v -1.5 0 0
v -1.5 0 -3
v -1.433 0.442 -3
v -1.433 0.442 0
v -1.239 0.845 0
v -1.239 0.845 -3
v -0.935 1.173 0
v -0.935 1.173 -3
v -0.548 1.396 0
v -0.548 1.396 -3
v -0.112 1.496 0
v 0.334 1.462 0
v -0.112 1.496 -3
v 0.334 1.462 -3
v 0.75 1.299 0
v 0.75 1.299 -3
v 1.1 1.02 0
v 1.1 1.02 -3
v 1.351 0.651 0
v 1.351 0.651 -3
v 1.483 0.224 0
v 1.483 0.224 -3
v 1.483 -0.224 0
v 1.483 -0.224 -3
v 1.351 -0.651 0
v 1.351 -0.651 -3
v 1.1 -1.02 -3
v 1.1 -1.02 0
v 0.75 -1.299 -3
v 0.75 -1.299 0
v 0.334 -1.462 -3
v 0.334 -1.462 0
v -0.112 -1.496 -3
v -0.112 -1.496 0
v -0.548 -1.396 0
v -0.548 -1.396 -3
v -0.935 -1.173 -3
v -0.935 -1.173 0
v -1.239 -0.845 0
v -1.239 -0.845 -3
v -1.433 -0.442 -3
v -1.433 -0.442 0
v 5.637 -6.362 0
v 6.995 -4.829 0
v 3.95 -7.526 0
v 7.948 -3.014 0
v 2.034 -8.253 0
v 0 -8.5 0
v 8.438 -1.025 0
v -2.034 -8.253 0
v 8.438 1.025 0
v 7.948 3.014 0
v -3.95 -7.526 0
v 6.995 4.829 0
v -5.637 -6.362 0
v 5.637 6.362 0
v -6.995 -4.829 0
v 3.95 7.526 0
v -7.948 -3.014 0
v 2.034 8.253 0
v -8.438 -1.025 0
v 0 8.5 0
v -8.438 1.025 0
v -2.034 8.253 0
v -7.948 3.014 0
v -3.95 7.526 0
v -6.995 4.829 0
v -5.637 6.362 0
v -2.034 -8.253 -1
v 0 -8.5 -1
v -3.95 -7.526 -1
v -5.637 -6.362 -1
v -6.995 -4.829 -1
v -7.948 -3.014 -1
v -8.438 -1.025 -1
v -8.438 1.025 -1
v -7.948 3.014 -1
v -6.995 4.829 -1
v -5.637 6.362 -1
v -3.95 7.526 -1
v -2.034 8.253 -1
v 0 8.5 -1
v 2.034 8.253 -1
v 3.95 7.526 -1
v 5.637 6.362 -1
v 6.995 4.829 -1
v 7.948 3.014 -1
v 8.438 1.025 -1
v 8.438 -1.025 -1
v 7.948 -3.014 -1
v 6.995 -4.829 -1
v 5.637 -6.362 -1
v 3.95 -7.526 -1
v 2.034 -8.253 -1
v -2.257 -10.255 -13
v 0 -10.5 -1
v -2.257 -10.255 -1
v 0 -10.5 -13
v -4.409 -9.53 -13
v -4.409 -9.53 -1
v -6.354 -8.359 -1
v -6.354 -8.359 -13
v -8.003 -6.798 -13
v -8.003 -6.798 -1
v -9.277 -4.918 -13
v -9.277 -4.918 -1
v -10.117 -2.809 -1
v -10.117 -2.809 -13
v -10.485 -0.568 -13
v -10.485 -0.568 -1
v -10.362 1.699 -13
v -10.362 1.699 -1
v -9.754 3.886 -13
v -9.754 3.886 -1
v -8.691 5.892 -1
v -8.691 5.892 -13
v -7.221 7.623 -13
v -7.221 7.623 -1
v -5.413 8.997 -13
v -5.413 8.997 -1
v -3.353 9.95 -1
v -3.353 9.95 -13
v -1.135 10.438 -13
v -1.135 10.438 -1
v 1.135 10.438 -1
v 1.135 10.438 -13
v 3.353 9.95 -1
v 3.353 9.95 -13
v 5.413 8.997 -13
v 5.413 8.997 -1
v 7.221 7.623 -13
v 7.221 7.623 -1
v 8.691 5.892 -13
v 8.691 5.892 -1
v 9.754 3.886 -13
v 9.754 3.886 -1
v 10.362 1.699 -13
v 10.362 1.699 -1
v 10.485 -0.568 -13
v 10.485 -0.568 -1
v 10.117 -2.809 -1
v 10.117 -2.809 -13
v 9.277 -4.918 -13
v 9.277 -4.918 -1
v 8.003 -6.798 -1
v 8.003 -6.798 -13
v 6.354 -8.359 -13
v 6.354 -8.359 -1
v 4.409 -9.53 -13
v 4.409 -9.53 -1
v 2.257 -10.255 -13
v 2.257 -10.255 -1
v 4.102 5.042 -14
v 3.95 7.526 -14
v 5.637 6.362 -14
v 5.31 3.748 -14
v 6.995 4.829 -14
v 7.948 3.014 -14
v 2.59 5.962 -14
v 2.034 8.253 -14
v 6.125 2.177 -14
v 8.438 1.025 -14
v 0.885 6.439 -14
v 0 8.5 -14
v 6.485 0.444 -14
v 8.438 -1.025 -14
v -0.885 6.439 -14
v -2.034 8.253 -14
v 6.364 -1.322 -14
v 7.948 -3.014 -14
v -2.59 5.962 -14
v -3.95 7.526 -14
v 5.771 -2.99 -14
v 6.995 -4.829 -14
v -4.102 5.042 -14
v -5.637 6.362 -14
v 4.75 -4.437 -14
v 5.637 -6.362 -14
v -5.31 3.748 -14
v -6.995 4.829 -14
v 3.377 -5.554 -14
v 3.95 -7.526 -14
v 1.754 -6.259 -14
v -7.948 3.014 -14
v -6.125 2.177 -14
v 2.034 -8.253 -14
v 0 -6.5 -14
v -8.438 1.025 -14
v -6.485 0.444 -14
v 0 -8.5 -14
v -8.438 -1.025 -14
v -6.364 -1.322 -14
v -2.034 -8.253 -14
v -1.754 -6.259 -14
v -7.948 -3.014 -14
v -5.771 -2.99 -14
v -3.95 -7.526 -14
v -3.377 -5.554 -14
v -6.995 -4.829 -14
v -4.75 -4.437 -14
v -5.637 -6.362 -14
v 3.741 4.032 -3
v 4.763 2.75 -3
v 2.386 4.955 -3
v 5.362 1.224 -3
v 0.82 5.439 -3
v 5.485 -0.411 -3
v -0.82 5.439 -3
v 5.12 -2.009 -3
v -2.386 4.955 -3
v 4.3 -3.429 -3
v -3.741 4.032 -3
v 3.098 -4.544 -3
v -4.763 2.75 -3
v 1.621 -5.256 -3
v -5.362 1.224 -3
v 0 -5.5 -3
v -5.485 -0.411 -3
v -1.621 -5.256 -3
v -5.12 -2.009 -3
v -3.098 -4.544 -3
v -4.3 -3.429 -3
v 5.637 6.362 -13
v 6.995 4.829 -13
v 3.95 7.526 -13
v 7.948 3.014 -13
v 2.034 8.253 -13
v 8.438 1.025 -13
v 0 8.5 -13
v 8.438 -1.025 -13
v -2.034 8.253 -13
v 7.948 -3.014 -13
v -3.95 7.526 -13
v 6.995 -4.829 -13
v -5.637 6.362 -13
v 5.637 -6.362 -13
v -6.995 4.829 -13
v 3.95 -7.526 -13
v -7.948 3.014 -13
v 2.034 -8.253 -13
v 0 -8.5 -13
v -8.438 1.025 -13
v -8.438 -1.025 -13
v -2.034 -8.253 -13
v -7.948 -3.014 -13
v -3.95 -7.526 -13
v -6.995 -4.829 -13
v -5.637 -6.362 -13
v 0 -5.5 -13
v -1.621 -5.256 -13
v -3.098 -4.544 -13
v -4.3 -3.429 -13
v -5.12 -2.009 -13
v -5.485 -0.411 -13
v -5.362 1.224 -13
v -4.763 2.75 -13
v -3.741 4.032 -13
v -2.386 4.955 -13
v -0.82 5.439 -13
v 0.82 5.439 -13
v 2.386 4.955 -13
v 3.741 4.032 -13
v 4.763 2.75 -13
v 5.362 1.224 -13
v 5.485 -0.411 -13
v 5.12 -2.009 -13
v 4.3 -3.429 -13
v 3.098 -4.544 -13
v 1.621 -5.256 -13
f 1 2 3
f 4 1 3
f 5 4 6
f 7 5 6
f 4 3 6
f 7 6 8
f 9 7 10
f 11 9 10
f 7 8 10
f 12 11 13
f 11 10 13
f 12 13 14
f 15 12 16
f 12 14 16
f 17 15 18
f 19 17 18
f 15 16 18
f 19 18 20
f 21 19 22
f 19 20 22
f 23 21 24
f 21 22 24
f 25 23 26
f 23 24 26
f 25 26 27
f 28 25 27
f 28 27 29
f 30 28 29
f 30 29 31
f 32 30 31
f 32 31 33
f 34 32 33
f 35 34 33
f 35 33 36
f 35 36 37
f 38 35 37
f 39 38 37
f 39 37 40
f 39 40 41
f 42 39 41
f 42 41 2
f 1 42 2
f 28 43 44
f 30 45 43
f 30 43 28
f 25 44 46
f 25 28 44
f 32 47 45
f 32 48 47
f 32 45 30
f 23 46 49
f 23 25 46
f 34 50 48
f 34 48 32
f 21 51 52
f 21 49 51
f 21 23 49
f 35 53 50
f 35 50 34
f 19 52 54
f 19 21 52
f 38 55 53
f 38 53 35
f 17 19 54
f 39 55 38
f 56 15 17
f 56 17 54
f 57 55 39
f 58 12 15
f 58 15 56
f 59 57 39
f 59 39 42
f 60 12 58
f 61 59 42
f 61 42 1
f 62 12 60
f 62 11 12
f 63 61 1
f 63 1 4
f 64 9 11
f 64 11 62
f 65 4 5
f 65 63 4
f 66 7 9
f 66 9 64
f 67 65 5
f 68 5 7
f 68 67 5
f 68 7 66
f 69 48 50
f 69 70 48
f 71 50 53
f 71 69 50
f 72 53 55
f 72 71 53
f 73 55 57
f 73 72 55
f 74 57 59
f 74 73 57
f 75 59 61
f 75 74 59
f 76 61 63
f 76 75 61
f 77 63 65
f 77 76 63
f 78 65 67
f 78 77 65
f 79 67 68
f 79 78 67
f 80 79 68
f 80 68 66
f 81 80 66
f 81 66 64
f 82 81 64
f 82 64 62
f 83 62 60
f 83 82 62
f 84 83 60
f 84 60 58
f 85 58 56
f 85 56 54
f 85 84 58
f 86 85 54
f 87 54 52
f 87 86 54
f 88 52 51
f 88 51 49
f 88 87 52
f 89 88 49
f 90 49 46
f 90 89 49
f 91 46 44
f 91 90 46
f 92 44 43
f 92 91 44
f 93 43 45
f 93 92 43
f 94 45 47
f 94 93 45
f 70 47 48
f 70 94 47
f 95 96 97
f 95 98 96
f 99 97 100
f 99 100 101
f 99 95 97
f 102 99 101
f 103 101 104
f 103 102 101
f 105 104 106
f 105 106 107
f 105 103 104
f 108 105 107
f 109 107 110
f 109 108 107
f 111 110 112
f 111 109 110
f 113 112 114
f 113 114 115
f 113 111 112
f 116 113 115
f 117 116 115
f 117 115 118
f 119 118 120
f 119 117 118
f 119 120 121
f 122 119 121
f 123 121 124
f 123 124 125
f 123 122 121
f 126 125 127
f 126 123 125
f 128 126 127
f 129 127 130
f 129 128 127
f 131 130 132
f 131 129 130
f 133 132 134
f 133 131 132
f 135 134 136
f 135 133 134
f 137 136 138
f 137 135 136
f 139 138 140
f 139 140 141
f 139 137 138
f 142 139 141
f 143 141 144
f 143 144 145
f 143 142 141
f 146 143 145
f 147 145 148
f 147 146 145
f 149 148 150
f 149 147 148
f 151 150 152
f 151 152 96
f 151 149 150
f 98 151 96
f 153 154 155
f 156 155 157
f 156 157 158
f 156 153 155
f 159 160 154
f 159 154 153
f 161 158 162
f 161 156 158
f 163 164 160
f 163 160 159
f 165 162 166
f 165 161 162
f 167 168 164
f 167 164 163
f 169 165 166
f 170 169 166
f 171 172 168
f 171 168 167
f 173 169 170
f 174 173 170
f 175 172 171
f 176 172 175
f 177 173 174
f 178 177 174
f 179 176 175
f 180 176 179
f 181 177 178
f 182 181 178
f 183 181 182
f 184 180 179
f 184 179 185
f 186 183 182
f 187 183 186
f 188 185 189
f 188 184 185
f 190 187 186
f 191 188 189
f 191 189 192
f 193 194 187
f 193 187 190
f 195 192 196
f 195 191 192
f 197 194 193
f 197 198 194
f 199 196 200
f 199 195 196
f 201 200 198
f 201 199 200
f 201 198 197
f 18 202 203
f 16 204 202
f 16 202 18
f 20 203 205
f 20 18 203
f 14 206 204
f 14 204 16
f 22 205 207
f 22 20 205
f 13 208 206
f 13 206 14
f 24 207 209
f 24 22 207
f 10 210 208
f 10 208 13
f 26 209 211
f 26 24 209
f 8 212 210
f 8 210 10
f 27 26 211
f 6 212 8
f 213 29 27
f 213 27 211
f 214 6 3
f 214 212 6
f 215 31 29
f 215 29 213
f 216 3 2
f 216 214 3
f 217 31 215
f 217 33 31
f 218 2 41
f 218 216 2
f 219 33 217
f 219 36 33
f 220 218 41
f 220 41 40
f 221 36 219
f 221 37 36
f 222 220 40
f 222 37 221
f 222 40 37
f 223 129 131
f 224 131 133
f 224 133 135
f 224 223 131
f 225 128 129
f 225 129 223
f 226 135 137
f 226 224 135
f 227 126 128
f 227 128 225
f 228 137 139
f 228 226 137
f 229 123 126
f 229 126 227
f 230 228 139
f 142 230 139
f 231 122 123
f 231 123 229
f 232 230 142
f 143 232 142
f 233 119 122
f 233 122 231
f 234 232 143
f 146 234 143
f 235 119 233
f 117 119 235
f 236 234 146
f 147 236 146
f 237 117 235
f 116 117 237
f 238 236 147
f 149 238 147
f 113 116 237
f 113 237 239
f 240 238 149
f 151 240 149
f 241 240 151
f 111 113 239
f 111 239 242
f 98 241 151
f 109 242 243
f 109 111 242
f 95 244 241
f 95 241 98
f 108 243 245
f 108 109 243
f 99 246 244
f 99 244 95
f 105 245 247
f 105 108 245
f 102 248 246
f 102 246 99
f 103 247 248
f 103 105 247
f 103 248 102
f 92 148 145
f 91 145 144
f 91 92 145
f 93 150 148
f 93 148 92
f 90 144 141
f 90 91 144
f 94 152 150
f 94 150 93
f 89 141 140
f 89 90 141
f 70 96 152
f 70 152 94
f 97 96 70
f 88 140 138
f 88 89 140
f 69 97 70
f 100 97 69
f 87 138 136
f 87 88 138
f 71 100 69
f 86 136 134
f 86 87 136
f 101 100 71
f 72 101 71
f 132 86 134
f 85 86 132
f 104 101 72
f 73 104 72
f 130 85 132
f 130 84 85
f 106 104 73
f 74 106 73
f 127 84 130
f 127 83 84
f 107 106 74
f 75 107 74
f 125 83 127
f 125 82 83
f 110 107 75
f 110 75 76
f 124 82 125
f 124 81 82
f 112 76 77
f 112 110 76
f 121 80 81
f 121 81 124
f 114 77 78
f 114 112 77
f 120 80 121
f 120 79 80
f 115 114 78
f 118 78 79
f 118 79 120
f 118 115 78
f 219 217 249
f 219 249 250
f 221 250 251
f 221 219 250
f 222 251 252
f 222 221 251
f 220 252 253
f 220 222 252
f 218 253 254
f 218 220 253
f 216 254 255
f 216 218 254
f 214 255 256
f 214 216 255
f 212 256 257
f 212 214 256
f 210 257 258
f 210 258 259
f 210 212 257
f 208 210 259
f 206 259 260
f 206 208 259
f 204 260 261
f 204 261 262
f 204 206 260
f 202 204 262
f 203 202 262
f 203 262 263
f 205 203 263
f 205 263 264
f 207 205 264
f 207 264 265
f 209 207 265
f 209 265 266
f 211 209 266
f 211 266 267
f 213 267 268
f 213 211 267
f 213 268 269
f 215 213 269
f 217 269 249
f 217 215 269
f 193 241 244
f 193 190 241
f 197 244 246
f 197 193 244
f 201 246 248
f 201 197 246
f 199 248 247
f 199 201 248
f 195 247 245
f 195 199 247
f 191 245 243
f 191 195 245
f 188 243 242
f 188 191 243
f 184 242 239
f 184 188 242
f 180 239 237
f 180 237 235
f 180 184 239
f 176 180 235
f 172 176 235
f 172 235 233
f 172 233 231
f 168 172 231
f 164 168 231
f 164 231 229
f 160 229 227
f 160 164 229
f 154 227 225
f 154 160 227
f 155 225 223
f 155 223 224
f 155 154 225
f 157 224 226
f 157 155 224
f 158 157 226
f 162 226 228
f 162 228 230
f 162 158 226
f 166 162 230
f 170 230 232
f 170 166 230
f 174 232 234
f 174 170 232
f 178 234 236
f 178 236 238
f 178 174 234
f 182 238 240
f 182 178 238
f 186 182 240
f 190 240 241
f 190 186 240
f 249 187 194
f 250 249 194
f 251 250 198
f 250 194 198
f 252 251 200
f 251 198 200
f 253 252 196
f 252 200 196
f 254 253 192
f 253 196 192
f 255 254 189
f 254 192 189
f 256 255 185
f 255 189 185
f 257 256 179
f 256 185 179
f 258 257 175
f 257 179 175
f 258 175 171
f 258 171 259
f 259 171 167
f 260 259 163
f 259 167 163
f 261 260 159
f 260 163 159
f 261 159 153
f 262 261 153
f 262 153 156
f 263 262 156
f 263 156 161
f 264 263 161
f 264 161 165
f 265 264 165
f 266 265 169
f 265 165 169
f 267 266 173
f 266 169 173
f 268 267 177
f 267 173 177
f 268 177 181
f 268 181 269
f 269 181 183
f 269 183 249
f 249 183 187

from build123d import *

# Parameters (mm, degrees)
F_3_0_3_DIAMETER_HOLE1_D = 3
CHAMFER1_SIZE            = 1


with BuildPart() as part:
    # Sketch1 → Revolve1 (revolve)
    with BuildSketch(Plane(origin=(0, 0, 0), x_dir=(0, 0, -1), z_dir=(1, 0, 0)), mode=Mode.PRIVATE) as revolve1_sk:
        Polygon((0, 0), (0, 8.5), (1, 8.5), (1, 10.5), (13, 10.5), (13, 8.5), (14, 8.5), (14, 5.5), (3, 5.5), (3, 0), align=None)
    revolve(revolve1_sk.sketch.rotate(Axis((0, 0, 21.219054242), (0, 0, -1)), 180), axis=Axis((0, 0, 21.219054242), (0, 0, -1)))

    # Ø3.0 (3) Diameter Hole1 (through all)
    with Locations(Plane.XY):
        with Locations((0, 0)):
            Hole(F_3_0_3_DIAMETER_HOLE1_D / 2)

    # Chamfer1
    chamfer1_edges = [part.edges().sort_by_distance(p)[0] for p in [
        (0, 5.5, -14),
    ]]
    chamfer(chamfer1_edges, length=CHAMFER1_SIZE)


solid = part.part
